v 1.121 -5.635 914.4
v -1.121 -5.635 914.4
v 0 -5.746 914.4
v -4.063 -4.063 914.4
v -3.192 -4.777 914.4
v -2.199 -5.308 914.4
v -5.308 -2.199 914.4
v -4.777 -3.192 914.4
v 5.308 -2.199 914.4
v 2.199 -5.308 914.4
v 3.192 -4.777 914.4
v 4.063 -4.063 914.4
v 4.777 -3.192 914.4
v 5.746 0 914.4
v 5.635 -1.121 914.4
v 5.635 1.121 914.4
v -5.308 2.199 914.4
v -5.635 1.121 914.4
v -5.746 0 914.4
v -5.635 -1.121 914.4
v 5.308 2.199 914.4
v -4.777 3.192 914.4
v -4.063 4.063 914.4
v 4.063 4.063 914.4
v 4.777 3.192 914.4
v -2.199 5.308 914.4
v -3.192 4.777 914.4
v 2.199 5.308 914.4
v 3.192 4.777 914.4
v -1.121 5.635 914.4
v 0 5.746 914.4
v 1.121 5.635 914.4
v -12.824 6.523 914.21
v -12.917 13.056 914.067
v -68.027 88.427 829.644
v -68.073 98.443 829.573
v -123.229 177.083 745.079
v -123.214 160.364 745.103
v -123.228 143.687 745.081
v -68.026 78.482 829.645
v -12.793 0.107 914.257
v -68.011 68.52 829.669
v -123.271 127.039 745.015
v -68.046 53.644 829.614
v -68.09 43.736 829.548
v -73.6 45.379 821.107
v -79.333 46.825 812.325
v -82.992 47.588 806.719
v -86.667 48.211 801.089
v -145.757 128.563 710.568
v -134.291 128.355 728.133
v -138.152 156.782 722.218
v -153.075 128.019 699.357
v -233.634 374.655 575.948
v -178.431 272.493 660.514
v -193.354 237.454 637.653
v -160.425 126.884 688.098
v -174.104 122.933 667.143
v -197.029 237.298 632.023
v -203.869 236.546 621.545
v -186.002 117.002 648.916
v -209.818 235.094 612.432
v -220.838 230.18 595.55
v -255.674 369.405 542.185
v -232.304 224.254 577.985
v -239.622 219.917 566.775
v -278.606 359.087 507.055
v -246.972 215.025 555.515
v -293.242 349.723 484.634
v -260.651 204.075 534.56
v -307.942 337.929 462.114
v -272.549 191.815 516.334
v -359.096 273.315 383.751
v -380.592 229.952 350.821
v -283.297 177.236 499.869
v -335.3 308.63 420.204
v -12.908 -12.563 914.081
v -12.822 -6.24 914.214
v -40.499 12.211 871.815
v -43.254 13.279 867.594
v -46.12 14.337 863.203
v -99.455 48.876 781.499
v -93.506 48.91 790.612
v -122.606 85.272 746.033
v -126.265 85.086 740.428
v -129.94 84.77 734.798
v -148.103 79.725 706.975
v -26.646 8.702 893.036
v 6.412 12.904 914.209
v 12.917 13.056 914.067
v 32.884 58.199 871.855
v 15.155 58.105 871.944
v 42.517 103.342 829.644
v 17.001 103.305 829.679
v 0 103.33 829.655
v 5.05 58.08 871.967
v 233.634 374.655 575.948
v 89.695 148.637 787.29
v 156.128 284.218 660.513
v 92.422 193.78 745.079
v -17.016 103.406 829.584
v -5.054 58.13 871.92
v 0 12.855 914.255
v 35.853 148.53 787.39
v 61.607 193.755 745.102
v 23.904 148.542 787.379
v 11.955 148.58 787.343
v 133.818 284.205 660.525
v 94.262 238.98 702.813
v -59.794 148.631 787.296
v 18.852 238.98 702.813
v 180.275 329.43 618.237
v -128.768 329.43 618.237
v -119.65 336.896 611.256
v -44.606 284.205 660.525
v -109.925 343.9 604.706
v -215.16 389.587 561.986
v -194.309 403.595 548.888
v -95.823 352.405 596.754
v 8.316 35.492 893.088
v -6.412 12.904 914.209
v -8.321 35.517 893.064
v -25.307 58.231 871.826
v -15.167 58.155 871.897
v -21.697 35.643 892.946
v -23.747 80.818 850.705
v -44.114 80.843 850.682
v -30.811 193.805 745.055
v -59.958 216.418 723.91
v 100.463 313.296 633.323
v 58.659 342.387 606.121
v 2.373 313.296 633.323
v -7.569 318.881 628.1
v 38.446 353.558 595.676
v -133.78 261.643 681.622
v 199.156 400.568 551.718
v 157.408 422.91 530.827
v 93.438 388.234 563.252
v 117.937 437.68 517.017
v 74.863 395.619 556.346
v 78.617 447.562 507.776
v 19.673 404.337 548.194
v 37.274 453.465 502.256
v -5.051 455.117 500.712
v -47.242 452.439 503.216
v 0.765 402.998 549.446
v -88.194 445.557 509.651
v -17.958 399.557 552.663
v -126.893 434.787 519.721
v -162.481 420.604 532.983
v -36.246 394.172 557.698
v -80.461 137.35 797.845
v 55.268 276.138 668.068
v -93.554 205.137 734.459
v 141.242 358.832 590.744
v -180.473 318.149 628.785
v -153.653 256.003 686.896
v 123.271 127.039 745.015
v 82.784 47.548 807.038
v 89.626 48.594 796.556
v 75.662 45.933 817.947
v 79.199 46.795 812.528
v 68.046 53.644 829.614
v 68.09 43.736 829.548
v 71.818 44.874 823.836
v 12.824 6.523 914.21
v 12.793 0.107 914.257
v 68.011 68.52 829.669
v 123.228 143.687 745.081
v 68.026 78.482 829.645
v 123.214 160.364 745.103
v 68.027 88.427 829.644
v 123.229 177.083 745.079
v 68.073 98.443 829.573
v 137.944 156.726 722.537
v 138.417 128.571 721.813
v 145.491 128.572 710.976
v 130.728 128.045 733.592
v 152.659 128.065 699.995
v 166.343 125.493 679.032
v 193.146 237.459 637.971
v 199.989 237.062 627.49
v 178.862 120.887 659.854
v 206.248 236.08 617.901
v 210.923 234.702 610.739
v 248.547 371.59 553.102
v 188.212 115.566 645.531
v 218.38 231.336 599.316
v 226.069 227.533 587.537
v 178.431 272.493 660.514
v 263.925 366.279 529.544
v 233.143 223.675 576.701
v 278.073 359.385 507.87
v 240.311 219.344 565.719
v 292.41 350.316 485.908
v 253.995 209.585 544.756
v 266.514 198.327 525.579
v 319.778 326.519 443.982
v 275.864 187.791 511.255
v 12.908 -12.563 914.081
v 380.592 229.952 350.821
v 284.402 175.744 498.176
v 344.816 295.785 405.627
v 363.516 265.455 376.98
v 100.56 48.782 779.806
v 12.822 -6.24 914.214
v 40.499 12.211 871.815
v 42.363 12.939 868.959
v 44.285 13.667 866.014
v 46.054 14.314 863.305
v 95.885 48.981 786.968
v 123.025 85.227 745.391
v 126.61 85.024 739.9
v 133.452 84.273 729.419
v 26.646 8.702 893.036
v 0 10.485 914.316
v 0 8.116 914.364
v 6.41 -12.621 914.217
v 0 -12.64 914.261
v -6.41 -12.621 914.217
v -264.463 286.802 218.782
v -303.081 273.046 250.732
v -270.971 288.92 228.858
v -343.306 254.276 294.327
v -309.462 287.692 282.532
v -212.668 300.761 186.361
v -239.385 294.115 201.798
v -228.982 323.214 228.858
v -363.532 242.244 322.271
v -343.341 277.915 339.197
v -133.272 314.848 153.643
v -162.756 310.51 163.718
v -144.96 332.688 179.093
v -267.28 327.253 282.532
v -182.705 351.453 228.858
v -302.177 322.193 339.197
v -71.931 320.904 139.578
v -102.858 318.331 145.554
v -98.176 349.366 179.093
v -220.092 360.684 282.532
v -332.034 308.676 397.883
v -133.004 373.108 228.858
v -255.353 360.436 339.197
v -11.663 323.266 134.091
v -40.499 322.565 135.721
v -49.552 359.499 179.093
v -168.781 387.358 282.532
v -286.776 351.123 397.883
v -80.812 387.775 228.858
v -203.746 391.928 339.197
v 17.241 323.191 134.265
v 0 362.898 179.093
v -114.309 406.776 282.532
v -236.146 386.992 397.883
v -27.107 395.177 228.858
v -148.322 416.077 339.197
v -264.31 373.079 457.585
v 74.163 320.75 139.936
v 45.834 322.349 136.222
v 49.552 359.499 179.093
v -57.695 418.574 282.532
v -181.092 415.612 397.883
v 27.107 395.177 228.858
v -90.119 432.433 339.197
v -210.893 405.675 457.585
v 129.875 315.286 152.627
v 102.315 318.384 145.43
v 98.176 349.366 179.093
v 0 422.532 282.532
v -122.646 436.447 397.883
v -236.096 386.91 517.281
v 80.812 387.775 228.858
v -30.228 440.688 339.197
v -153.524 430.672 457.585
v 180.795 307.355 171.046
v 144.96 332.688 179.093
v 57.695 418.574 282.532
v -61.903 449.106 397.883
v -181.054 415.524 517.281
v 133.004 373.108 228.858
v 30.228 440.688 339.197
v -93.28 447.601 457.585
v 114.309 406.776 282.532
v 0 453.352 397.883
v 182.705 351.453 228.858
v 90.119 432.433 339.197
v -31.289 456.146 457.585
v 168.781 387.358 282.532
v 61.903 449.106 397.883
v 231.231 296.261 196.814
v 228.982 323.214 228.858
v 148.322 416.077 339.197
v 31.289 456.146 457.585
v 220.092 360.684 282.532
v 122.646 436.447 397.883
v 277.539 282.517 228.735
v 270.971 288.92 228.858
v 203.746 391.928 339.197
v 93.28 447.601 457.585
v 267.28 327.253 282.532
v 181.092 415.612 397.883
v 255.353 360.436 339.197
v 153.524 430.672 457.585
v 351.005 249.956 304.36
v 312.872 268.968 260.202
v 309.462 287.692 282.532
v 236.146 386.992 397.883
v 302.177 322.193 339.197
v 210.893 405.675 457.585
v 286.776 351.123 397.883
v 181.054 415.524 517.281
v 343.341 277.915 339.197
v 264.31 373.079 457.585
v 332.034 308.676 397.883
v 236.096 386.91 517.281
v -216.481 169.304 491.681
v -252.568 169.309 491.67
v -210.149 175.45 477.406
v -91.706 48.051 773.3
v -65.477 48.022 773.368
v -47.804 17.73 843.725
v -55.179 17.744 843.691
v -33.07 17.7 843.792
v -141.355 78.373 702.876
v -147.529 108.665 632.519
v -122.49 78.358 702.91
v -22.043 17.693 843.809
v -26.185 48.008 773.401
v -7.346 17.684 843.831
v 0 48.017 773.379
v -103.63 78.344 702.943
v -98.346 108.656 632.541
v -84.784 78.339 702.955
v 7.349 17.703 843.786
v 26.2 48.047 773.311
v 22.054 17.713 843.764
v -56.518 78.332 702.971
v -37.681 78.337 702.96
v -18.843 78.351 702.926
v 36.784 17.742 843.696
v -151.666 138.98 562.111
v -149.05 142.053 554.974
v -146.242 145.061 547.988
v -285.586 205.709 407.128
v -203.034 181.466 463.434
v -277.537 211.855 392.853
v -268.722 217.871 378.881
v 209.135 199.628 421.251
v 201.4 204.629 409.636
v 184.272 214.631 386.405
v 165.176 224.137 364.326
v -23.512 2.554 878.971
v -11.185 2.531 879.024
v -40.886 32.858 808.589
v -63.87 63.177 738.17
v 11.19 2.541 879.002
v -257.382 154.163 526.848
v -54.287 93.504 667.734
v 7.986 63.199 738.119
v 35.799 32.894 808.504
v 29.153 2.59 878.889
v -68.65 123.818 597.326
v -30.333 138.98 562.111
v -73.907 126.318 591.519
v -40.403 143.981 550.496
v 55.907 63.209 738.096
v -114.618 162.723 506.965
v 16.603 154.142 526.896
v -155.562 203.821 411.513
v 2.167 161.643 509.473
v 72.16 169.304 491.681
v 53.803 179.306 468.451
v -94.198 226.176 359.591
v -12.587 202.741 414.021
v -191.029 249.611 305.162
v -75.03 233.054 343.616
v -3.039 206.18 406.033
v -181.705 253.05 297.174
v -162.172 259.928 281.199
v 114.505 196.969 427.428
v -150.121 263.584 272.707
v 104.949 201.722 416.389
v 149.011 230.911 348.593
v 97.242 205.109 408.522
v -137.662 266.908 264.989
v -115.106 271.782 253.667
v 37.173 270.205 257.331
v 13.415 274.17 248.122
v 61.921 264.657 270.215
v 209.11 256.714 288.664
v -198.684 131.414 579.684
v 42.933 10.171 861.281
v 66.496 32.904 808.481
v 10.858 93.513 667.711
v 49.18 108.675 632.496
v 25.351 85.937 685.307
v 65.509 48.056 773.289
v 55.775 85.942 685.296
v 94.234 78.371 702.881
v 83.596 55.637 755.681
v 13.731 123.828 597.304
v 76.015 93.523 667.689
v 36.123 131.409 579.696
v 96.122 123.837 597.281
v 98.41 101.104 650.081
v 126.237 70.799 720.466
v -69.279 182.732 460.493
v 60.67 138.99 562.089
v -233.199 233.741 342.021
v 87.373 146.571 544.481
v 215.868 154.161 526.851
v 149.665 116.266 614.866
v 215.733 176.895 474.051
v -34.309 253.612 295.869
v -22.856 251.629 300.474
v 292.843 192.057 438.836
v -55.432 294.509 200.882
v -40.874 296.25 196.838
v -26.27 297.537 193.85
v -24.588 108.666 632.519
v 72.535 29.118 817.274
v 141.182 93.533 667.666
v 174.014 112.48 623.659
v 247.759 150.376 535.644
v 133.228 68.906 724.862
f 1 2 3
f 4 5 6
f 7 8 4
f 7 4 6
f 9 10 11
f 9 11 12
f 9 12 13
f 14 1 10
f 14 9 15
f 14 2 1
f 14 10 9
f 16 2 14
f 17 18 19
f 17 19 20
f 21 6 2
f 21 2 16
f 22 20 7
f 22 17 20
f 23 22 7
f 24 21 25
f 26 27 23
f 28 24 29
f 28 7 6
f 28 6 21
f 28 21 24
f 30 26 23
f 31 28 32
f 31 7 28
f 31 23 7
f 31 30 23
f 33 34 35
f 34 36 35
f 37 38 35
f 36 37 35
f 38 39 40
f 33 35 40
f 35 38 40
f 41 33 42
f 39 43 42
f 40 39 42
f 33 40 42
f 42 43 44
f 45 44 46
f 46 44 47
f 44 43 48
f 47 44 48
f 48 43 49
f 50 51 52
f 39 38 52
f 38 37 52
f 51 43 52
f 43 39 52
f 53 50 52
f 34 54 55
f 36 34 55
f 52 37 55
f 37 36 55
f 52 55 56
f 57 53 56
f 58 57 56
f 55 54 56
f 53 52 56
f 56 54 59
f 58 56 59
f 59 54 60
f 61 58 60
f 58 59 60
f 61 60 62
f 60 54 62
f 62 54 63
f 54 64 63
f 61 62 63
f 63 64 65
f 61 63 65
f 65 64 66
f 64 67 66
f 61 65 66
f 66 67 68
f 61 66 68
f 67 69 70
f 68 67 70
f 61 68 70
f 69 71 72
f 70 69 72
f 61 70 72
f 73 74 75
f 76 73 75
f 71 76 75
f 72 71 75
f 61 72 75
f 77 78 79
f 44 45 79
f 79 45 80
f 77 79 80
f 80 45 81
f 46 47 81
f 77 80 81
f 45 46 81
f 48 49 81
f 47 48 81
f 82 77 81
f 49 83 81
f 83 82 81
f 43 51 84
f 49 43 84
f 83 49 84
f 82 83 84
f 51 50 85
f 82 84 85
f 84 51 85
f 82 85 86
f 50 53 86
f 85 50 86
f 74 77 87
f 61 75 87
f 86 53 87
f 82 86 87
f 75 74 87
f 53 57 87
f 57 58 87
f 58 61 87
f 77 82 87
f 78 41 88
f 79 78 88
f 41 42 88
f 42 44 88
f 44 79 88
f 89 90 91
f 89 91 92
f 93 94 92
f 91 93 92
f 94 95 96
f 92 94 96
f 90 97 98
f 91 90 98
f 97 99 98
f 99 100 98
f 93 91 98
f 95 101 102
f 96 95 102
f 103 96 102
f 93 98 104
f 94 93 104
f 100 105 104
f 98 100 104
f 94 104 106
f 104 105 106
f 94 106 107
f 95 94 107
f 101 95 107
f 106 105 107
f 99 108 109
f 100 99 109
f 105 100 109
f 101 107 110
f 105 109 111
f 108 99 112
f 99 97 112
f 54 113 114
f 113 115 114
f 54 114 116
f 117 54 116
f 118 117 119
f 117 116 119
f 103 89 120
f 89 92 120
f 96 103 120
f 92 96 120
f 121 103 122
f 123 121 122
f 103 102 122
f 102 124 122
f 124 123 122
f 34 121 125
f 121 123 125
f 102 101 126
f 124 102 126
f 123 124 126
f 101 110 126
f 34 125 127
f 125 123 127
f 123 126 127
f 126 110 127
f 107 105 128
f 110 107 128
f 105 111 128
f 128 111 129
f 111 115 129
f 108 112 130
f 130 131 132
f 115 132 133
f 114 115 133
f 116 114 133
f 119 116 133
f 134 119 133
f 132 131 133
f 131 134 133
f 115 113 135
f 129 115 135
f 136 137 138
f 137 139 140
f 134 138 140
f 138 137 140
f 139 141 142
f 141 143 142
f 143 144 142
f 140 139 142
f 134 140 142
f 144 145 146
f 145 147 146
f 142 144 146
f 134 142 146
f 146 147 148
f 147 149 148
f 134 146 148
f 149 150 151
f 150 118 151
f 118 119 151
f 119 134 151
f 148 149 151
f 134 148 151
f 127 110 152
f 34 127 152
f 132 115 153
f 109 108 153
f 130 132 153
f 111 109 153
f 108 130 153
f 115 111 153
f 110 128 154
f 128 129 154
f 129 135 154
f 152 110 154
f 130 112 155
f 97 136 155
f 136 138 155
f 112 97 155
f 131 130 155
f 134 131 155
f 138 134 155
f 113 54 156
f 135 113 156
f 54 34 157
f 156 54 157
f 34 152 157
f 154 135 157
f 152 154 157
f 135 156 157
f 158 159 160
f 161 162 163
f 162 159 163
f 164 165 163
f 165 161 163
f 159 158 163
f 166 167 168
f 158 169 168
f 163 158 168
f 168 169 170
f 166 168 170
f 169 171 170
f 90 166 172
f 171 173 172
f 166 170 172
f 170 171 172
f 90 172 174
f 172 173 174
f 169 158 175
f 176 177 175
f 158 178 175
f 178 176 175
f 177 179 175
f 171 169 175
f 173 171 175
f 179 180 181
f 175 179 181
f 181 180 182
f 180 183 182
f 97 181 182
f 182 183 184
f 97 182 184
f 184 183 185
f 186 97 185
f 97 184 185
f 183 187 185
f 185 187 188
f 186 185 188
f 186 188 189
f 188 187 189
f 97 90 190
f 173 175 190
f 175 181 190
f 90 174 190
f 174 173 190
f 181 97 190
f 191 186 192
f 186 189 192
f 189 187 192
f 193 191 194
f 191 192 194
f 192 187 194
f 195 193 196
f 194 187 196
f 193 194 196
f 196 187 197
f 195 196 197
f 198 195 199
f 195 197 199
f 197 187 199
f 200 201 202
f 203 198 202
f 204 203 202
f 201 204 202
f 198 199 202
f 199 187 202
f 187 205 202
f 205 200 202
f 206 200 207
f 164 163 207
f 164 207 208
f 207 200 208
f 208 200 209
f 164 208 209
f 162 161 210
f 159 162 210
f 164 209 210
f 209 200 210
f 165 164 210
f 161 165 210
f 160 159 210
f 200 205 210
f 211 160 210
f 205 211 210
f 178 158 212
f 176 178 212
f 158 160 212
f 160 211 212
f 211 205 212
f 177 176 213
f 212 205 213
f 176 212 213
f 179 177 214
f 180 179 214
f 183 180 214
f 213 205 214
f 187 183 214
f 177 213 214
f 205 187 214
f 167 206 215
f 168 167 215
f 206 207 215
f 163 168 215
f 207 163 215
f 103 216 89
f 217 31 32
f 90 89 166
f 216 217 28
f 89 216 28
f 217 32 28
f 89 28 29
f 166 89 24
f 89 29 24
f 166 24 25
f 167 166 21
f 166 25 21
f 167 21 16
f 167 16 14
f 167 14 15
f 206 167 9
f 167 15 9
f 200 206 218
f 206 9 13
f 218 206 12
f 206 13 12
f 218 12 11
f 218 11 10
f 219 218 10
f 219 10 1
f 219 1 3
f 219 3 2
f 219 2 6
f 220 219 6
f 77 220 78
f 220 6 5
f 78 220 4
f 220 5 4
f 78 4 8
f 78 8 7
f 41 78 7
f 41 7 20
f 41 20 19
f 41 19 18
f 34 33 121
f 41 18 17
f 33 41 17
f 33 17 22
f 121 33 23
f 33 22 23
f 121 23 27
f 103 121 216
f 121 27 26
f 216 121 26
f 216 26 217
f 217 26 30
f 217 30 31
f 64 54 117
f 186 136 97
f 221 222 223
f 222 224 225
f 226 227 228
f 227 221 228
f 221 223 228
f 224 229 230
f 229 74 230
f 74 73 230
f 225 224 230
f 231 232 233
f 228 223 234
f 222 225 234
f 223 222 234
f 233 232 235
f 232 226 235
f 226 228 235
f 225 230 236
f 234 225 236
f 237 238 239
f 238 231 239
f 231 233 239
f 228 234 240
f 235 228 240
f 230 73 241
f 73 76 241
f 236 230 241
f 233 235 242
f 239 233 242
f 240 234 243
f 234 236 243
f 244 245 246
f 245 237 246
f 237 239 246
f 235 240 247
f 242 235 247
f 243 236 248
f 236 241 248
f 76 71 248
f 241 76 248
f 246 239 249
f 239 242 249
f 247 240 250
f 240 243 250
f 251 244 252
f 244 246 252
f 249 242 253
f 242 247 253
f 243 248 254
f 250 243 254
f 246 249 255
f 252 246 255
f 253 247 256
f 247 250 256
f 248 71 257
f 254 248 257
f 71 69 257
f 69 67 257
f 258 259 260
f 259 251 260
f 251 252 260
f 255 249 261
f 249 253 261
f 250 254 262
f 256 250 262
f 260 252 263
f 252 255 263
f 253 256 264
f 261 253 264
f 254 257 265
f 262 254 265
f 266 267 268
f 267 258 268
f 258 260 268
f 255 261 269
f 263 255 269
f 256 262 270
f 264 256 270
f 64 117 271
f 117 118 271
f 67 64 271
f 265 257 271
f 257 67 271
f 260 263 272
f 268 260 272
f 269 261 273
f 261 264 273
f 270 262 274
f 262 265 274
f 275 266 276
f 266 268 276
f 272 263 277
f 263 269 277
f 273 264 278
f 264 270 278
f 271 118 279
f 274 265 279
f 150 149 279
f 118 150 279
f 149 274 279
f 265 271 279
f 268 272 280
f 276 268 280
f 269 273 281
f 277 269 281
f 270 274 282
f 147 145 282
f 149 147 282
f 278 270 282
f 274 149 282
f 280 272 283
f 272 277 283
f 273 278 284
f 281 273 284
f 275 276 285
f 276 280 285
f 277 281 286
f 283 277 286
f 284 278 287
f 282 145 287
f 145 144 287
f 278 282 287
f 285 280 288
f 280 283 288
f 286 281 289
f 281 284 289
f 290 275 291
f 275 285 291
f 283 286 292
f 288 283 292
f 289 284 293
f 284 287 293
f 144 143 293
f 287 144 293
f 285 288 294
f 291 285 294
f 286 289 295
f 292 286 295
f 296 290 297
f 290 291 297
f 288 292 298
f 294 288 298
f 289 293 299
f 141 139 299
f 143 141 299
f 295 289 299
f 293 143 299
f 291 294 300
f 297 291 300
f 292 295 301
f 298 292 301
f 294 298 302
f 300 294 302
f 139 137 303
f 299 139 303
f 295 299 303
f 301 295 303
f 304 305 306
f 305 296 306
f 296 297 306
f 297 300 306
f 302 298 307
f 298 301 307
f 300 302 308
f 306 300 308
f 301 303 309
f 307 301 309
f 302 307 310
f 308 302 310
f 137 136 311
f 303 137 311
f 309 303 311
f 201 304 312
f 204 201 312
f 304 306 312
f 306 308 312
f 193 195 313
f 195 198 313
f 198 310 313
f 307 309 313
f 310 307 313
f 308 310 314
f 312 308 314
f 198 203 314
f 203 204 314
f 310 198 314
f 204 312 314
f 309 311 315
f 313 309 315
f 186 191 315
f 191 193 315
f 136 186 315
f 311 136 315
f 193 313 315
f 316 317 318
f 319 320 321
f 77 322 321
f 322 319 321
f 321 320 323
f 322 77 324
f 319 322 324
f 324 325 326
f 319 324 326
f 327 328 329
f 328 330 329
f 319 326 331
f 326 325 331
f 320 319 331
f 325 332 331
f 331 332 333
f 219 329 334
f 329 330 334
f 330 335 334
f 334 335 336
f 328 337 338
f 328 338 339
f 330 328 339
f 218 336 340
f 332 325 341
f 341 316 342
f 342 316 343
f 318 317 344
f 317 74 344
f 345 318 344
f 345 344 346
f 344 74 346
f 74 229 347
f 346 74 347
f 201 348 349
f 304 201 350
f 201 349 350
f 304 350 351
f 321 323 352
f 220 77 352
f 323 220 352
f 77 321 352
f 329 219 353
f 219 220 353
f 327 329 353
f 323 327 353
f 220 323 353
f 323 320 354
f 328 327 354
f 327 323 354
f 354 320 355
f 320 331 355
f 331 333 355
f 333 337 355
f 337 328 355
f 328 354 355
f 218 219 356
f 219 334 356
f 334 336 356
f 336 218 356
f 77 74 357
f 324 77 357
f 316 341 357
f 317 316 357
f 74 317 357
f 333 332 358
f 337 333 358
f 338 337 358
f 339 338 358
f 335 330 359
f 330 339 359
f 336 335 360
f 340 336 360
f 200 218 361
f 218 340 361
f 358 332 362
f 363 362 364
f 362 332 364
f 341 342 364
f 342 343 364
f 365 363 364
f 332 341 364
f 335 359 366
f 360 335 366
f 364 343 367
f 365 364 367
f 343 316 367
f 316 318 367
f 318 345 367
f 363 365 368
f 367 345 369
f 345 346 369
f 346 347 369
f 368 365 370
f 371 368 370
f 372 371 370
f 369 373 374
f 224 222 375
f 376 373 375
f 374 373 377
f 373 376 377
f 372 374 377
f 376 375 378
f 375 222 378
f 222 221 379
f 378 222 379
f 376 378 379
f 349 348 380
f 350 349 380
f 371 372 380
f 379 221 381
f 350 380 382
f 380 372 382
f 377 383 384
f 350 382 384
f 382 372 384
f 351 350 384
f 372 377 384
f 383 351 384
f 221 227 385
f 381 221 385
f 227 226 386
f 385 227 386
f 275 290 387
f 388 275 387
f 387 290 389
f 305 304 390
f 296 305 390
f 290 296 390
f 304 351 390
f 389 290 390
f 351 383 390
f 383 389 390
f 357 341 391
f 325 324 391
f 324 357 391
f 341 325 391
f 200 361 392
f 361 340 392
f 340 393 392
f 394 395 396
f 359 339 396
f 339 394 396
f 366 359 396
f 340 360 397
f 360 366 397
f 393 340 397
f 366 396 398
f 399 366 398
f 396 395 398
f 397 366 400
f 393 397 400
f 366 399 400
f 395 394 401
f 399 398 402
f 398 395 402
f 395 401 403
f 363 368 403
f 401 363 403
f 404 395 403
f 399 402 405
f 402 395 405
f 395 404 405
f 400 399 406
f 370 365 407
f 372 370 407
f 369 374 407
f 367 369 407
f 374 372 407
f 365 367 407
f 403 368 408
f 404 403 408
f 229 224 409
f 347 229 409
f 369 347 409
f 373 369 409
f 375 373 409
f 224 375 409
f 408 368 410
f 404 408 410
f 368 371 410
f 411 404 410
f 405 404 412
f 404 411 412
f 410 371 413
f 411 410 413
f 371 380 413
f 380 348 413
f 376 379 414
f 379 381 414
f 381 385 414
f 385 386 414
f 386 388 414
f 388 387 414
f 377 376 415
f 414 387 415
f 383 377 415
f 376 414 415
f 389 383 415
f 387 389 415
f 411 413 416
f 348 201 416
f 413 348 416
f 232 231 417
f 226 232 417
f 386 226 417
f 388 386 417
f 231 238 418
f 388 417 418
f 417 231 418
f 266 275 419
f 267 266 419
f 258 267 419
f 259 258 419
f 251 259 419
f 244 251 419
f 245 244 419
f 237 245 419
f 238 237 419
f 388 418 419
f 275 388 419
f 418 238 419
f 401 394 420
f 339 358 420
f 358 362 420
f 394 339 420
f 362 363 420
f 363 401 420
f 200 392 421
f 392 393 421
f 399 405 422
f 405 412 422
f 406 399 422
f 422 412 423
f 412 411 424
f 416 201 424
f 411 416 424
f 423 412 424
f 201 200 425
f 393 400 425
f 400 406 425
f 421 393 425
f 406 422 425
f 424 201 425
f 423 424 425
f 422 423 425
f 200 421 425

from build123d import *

# Parameters (mm, degrees)
F2_W = 25.4
F2_H = 25.4
F0_W = 1219.2
F0_H = 609.6


with BuildPart() as f3:
    # F2 (on offset) → F3 section 0
    with BuildSketch(Plane.XY.offset(914.4)):
        Rectangle(F2_W, F2_H)
    # F0 (on Top) → F3 section 1
    with BuildSketch(Plane.XY):
        with Locations((0, 685.8)):
            Rectangle(F0_W, F0_H)
    loft()

    # F4 (on Right) → F5 (revolve, intersect)
    with BuildSketch(Plane.YZ):
        with BuildLine():
            ThreePointArc((0, 0), (457.218051, 457.218051), (0, 914.436102))
            Line((0, 914.436102), (0, 0))
        make_face()
    revolve(axis=Axis((0, 0, 457.218051), (0, 0, -1)), mode=Mode.INTERSECT)


solid = f3.part
